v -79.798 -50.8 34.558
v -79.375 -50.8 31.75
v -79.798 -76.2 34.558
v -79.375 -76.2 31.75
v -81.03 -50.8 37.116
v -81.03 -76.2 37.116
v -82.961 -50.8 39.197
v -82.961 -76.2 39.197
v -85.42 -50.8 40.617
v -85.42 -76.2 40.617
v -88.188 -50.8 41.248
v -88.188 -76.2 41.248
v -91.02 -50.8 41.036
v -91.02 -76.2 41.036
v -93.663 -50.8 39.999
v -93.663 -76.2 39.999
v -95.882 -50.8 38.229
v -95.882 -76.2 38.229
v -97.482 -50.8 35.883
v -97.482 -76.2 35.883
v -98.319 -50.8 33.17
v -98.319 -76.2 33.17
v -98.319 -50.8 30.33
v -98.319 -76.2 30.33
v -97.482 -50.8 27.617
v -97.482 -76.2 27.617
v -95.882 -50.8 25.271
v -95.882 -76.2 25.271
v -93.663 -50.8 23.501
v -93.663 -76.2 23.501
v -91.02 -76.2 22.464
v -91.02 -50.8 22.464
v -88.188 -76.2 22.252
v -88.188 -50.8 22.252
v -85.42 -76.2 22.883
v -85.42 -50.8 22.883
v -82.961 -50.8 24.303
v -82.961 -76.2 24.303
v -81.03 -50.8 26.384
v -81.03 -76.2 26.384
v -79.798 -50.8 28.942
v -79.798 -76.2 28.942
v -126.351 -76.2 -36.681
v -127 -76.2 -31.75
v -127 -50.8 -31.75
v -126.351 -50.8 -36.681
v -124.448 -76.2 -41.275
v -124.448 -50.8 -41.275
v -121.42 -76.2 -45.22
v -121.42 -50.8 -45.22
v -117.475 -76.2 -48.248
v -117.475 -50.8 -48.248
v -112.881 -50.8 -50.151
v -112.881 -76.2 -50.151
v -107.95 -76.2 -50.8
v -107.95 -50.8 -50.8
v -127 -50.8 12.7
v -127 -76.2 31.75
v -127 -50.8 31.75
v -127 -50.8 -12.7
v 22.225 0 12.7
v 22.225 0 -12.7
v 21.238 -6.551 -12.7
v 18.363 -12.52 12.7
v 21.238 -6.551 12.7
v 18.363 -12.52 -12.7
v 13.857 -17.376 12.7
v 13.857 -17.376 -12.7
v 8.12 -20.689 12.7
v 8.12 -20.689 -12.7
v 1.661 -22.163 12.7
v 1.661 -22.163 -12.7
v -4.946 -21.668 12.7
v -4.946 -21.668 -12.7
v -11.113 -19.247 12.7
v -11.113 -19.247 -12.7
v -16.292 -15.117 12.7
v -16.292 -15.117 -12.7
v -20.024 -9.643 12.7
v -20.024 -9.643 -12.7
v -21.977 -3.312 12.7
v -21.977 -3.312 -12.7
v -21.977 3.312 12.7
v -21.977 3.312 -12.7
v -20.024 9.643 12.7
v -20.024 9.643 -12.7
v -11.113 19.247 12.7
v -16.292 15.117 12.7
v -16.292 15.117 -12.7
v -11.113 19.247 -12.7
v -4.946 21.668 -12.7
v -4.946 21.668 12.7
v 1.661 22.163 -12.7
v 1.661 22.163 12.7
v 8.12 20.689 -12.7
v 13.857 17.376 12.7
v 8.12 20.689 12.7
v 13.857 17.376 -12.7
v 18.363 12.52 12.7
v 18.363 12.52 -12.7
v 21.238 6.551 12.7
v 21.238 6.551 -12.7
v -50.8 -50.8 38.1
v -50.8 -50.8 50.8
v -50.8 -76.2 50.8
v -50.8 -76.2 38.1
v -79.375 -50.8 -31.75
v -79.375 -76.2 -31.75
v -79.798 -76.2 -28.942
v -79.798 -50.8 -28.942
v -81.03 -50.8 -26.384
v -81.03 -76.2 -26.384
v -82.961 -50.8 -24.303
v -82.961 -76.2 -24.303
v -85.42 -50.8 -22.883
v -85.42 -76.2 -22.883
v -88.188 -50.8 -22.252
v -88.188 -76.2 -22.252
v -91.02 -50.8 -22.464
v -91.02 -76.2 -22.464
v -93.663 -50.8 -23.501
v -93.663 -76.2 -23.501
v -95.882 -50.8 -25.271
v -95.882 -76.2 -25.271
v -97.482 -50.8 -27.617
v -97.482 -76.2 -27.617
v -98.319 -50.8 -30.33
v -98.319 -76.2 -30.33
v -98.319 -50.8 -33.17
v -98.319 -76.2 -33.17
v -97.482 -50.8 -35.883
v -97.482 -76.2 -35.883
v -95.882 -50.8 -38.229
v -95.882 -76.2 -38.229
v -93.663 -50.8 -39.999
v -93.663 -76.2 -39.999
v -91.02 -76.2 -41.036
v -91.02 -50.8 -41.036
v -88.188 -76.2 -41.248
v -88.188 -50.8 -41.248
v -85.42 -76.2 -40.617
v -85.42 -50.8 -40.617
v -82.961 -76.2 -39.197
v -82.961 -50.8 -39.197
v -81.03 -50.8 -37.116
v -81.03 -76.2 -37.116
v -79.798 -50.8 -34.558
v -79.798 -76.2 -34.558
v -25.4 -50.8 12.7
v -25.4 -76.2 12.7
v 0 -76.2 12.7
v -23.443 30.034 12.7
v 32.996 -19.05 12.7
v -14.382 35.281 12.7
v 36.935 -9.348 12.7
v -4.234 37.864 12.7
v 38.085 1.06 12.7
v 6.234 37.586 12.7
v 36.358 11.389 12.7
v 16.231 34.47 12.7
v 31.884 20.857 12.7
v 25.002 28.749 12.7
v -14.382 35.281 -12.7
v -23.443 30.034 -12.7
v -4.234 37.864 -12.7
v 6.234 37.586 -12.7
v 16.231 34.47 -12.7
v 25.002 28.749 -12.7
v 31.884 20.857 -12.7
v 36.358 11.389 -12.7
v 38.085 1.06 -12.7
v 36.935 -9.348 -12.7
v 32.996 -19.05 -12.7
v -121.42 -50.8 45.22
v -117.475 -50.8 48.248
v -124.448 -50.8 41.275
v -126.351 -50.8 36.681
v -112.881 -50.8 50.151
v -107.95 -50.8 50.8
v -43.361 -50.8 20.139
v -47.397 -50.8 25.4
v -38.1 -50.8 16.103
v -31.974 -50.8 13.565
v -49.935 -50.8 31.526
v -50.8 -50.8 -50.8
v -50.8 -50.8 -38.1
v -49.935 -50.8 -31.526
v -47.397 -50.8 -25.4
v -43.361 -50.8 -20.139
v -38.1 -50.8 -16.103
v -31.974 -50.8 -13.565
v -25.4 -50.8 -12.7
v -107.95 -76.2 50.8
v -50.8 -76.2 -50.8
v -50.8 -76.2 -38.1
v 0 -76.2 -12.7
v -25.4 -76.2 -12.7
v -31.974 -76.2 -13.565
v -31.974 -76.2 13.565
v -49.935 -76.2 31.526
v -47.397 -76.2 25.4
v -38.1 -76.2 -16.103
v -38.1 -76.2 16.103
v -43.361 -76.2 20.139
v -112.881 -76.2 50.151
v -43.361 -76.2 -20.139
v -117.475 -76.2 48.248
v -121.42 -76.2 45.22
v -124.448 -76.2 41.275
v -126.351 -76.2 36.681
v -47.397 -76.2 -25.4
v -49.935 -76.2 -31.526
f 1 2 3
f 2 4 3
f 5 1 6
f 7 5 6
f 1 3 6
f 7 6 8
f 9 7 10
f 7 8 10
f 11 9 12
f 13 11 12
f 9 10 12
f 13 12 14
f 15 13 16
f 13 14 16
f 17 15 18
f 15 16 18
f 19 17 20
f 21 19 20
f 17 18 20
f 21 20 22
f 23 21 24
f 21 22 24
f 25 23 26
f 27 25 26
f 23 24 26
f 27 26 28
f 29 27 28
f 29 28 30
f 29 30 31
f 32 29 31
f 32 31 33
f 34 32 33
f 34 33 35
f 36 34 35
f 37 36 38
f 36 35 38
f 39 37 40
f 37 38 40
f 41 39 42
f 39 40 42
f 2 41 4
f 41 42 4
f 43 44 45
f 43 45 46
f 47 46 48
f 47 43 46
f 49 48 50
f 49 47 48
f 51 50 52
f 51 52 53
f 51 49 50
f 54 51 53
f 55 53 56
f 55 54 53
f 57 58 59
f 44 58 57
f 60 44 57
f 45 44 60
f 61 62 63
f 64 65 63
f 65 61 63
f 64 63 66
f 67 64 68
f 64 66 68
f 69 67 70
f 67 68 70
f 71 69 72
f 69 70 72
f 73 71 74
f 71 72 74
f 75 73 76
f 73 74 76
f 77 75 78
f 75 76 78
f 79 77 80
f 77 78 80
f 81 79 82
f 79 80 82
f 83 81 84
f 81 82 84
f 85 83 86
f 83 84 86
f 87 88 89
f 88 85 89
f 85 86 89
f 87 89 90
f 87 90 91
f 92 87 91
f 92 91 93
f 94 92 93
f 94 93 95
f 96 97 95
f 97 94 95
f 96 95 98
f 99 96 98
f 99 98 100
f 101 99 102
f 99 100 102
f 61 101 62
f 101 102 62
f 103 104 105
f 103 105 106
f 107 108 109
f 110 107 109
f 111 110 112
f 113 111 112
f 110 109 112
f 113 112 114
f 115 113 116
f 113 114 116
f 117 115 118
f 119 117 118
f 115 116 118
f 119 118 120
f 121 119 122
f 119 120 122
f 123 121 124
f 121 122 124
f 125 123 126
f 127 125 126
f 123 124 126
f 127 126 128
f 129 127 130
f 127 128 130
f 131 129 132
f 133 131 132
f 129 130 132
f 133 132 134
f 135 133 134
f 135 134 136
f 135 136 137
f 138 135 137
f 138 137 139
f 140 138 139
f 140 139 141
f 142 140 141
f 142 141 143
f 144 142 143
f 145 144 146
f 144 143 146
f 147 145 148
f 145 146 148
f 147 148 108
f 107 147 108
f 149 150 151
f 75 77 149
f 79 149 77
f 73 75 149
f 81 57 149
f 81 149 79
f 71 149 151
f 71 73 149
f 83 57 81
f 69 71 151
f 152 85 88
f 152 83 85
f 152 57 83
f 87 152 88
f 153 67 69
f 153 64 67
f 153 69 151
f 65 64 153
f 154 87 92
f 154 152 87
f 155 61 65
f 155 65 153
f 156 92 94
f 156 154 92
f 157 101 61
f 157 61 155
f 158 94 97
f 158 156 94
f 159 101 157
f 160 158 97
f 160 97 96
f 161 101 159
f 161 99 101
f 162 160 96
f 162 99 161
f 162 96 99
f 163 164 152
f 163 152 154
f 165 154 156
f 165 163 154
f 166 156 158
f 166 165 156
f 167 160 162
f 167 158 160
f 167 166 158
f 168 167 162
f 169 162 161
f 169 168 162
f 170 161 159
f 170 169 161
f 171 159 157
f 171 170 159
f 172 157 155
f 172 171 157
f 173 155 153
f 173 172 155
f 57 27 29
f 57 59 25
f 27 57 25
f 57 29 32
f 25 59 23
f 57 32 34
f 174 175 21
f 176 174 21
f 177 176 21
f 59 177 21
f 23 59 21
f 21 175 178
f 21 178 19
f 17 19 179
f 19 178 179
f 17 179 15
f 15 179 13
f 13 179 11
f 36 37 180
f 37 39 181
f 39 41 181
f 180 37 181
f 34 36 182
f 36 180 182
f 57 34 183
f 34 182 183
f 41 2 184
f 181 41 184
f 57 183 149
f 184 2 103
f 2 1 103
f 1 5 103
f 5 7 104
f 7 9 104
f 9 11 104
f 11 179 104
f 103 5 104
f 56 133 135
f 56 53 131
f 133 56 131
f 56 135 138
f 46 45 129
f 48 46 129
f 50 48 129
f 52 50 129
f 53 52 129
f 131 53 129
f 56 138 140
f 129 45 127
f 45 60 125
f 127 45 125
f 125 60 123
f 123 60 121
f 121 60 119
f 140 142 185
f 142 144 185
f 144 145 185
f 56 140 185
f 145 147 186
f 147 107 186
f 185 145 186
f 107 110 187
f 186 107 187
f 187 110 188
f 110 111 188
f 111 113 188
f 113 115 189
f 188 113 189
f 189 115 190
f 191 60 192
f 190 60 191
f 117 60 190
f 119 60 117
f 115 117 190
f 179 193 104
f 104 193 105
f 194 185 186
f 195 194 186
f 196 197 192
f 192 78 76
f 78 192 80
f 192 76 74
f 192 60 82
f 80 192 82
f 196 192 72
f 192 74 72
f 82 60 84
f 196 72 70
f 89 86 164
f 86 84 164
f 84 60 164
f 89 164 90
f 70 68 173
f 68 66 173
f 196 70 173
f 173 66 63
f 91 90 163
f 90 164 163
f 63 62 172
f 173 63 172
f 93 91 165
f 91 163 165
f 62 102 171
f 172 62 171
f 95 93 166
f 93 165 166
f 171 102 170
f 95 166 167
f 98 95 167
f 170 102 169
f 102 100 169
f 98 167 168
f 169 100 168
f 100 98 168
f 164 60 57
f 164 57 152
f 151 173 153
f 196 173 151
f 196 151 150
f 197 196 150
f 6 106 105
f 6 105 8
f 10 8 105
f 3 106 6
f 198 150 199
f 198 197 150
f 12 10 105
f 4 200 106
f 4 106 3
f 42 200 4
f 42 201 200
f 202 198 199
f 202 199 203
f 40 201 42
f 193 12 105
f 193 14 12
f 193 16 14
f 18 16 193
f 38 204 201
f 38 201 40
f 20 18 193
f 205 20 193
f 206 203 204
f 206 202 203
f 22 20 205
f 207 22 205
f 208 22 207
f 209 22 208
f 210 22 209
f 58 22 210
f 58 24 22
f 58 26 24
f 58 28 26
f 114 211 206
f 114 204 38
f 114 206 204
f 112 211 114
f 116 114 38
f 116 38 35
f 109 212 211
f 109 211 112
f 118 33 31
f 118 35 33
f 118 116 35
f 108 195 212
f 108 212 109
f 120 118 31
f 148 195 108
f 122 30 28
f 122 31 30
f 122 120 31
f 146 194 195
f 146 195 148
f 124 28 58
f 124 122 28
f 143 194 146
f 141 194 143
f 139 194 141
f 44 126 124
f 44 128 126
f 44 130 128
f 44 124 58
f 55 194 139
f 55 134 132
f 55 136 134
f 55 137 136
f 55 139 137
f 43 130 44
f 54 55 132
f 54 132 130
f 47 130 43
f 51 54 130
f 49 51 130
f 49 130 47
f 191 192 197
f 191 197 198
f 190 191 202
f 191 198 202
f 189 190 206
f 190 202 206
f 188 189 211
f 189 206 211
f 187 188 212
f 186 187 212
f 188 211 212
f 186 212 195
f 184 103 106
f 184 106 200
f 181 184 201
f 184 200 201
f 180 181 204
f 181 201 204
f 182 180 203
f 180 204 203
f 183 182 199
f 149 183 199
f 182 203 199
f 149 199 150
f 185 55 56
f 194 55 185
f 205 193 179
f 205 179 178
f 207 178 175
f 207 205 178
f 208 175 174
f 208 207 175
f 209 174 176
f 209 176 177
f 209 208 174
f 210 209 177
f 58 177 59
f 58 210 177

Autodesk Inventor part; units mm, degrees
ref_plane "YZ Plane" through (0, 0, 0) normal (1, 0, 0) x (0, 1, 0)
ref_plane "XZ Plane" through (0, 0, 0) normal (0, 1, 0) x (-1, 0, 0)
ref_plane "XY Plane" through (0, 0, 0) normal (0, 0, 1) x (1, 0, 0)
sketch "Sketch1" plane through (0, 0, 0) normal (0, 0, 1) x (1, 0, 0)
  circle A0 centre (0, 0) radius 22.225
  arc A1 (32.9956, -19.05) -> (-23.4434, 30.0336) centre (0, 0) ccw
  line L0 (32.9956, -19.05) -> (0, -76.2)
  line L1 (0, -76.2) -> (-127, -76.2)
  line L2 (-127, -76.2) -> (-127, -50.8)
  line L3 (-127, -50.8) -> (-23.4434, 30.0336)
  dimension "d0" = 44.45
  dimension "d1" = 38.1
  dimension "d2" = 76.2
  dimension "d3" = 127
  dimension "d4" = 25.4
extrude "Extrusion1" add sketch "Sketch1" along normal mid plane 25.4
sketch "Sketch2" plane through (-127, -76.2, 12.7) normal (0, -1, 0) x (1, 0, 0)
  line L0 (0, -25.4) -> (0, 0) construction
  line L1 (0, -12.7) -> (165.1, -12.7) construction
  line L2 (165.1, -25.4) -> (165.1, 0) construction
  line L3 (0, -12.7) -> (0, 19.05)
  line L4 (19.05, 38.1) -> (76.2, 38.1)
  line L5 (76.2, 38.1) -> (76.2, 25.4)
  line L6 (76.2, 25.4) -> (76.2, 0.0039) construction
  arc A0 (76.2, 25.4) -> (101.6, 0) centre (101.6, 25.4) ccw
  line L7 (101.6, 0) -> (0, 0)
  circle A1 centre (38.1, 19.05) radius 9.525
  arc A2 (19.05, 38.1) -> (0, 19.05) centre (19.05, 19.05) ccw
  line L8 (0, 0) -> (0, -25.4) construction
  line L9 (0, -12.7) -> (0, -44.45)
  line L10 (19.05, -63.5) -> (76.2, -63.5)
  line L11 (76.2, -63.5) -> (76.2, -50.8)
  line L12 (76.2, -50.8) -> (76.2, -25.4039) construction
  arc A3 (101.6, -25.4) -> (76.2, -50.8) centre (101.6, -50.8) ccw
  line L13 (101.6, -25.4) -> (0, -25.4)
  circle A4 centre (38.1, -44.45) radius 9.525
  arc A5 (0, -44.45) -> (19.05, -63.5) centre (19.05, -44.45) ccw
  point P0 (127, -12.7)
  point P1 (0, 38.1)
  point P2 (0, -63.5)
  dimension "d7" = 19.05
  dimension "d8" = 101.6
  dimension "d9" = 19.05
  dimension "d10" = 76.2
  dimension "d11" = 25.4
  dimension "d12" = 19.05
  dimension "d13" = 38.1
extrude "Extrusion2" add sketch "Sketch2" against normal blind 25.4
properties part number "AnchorBase"
